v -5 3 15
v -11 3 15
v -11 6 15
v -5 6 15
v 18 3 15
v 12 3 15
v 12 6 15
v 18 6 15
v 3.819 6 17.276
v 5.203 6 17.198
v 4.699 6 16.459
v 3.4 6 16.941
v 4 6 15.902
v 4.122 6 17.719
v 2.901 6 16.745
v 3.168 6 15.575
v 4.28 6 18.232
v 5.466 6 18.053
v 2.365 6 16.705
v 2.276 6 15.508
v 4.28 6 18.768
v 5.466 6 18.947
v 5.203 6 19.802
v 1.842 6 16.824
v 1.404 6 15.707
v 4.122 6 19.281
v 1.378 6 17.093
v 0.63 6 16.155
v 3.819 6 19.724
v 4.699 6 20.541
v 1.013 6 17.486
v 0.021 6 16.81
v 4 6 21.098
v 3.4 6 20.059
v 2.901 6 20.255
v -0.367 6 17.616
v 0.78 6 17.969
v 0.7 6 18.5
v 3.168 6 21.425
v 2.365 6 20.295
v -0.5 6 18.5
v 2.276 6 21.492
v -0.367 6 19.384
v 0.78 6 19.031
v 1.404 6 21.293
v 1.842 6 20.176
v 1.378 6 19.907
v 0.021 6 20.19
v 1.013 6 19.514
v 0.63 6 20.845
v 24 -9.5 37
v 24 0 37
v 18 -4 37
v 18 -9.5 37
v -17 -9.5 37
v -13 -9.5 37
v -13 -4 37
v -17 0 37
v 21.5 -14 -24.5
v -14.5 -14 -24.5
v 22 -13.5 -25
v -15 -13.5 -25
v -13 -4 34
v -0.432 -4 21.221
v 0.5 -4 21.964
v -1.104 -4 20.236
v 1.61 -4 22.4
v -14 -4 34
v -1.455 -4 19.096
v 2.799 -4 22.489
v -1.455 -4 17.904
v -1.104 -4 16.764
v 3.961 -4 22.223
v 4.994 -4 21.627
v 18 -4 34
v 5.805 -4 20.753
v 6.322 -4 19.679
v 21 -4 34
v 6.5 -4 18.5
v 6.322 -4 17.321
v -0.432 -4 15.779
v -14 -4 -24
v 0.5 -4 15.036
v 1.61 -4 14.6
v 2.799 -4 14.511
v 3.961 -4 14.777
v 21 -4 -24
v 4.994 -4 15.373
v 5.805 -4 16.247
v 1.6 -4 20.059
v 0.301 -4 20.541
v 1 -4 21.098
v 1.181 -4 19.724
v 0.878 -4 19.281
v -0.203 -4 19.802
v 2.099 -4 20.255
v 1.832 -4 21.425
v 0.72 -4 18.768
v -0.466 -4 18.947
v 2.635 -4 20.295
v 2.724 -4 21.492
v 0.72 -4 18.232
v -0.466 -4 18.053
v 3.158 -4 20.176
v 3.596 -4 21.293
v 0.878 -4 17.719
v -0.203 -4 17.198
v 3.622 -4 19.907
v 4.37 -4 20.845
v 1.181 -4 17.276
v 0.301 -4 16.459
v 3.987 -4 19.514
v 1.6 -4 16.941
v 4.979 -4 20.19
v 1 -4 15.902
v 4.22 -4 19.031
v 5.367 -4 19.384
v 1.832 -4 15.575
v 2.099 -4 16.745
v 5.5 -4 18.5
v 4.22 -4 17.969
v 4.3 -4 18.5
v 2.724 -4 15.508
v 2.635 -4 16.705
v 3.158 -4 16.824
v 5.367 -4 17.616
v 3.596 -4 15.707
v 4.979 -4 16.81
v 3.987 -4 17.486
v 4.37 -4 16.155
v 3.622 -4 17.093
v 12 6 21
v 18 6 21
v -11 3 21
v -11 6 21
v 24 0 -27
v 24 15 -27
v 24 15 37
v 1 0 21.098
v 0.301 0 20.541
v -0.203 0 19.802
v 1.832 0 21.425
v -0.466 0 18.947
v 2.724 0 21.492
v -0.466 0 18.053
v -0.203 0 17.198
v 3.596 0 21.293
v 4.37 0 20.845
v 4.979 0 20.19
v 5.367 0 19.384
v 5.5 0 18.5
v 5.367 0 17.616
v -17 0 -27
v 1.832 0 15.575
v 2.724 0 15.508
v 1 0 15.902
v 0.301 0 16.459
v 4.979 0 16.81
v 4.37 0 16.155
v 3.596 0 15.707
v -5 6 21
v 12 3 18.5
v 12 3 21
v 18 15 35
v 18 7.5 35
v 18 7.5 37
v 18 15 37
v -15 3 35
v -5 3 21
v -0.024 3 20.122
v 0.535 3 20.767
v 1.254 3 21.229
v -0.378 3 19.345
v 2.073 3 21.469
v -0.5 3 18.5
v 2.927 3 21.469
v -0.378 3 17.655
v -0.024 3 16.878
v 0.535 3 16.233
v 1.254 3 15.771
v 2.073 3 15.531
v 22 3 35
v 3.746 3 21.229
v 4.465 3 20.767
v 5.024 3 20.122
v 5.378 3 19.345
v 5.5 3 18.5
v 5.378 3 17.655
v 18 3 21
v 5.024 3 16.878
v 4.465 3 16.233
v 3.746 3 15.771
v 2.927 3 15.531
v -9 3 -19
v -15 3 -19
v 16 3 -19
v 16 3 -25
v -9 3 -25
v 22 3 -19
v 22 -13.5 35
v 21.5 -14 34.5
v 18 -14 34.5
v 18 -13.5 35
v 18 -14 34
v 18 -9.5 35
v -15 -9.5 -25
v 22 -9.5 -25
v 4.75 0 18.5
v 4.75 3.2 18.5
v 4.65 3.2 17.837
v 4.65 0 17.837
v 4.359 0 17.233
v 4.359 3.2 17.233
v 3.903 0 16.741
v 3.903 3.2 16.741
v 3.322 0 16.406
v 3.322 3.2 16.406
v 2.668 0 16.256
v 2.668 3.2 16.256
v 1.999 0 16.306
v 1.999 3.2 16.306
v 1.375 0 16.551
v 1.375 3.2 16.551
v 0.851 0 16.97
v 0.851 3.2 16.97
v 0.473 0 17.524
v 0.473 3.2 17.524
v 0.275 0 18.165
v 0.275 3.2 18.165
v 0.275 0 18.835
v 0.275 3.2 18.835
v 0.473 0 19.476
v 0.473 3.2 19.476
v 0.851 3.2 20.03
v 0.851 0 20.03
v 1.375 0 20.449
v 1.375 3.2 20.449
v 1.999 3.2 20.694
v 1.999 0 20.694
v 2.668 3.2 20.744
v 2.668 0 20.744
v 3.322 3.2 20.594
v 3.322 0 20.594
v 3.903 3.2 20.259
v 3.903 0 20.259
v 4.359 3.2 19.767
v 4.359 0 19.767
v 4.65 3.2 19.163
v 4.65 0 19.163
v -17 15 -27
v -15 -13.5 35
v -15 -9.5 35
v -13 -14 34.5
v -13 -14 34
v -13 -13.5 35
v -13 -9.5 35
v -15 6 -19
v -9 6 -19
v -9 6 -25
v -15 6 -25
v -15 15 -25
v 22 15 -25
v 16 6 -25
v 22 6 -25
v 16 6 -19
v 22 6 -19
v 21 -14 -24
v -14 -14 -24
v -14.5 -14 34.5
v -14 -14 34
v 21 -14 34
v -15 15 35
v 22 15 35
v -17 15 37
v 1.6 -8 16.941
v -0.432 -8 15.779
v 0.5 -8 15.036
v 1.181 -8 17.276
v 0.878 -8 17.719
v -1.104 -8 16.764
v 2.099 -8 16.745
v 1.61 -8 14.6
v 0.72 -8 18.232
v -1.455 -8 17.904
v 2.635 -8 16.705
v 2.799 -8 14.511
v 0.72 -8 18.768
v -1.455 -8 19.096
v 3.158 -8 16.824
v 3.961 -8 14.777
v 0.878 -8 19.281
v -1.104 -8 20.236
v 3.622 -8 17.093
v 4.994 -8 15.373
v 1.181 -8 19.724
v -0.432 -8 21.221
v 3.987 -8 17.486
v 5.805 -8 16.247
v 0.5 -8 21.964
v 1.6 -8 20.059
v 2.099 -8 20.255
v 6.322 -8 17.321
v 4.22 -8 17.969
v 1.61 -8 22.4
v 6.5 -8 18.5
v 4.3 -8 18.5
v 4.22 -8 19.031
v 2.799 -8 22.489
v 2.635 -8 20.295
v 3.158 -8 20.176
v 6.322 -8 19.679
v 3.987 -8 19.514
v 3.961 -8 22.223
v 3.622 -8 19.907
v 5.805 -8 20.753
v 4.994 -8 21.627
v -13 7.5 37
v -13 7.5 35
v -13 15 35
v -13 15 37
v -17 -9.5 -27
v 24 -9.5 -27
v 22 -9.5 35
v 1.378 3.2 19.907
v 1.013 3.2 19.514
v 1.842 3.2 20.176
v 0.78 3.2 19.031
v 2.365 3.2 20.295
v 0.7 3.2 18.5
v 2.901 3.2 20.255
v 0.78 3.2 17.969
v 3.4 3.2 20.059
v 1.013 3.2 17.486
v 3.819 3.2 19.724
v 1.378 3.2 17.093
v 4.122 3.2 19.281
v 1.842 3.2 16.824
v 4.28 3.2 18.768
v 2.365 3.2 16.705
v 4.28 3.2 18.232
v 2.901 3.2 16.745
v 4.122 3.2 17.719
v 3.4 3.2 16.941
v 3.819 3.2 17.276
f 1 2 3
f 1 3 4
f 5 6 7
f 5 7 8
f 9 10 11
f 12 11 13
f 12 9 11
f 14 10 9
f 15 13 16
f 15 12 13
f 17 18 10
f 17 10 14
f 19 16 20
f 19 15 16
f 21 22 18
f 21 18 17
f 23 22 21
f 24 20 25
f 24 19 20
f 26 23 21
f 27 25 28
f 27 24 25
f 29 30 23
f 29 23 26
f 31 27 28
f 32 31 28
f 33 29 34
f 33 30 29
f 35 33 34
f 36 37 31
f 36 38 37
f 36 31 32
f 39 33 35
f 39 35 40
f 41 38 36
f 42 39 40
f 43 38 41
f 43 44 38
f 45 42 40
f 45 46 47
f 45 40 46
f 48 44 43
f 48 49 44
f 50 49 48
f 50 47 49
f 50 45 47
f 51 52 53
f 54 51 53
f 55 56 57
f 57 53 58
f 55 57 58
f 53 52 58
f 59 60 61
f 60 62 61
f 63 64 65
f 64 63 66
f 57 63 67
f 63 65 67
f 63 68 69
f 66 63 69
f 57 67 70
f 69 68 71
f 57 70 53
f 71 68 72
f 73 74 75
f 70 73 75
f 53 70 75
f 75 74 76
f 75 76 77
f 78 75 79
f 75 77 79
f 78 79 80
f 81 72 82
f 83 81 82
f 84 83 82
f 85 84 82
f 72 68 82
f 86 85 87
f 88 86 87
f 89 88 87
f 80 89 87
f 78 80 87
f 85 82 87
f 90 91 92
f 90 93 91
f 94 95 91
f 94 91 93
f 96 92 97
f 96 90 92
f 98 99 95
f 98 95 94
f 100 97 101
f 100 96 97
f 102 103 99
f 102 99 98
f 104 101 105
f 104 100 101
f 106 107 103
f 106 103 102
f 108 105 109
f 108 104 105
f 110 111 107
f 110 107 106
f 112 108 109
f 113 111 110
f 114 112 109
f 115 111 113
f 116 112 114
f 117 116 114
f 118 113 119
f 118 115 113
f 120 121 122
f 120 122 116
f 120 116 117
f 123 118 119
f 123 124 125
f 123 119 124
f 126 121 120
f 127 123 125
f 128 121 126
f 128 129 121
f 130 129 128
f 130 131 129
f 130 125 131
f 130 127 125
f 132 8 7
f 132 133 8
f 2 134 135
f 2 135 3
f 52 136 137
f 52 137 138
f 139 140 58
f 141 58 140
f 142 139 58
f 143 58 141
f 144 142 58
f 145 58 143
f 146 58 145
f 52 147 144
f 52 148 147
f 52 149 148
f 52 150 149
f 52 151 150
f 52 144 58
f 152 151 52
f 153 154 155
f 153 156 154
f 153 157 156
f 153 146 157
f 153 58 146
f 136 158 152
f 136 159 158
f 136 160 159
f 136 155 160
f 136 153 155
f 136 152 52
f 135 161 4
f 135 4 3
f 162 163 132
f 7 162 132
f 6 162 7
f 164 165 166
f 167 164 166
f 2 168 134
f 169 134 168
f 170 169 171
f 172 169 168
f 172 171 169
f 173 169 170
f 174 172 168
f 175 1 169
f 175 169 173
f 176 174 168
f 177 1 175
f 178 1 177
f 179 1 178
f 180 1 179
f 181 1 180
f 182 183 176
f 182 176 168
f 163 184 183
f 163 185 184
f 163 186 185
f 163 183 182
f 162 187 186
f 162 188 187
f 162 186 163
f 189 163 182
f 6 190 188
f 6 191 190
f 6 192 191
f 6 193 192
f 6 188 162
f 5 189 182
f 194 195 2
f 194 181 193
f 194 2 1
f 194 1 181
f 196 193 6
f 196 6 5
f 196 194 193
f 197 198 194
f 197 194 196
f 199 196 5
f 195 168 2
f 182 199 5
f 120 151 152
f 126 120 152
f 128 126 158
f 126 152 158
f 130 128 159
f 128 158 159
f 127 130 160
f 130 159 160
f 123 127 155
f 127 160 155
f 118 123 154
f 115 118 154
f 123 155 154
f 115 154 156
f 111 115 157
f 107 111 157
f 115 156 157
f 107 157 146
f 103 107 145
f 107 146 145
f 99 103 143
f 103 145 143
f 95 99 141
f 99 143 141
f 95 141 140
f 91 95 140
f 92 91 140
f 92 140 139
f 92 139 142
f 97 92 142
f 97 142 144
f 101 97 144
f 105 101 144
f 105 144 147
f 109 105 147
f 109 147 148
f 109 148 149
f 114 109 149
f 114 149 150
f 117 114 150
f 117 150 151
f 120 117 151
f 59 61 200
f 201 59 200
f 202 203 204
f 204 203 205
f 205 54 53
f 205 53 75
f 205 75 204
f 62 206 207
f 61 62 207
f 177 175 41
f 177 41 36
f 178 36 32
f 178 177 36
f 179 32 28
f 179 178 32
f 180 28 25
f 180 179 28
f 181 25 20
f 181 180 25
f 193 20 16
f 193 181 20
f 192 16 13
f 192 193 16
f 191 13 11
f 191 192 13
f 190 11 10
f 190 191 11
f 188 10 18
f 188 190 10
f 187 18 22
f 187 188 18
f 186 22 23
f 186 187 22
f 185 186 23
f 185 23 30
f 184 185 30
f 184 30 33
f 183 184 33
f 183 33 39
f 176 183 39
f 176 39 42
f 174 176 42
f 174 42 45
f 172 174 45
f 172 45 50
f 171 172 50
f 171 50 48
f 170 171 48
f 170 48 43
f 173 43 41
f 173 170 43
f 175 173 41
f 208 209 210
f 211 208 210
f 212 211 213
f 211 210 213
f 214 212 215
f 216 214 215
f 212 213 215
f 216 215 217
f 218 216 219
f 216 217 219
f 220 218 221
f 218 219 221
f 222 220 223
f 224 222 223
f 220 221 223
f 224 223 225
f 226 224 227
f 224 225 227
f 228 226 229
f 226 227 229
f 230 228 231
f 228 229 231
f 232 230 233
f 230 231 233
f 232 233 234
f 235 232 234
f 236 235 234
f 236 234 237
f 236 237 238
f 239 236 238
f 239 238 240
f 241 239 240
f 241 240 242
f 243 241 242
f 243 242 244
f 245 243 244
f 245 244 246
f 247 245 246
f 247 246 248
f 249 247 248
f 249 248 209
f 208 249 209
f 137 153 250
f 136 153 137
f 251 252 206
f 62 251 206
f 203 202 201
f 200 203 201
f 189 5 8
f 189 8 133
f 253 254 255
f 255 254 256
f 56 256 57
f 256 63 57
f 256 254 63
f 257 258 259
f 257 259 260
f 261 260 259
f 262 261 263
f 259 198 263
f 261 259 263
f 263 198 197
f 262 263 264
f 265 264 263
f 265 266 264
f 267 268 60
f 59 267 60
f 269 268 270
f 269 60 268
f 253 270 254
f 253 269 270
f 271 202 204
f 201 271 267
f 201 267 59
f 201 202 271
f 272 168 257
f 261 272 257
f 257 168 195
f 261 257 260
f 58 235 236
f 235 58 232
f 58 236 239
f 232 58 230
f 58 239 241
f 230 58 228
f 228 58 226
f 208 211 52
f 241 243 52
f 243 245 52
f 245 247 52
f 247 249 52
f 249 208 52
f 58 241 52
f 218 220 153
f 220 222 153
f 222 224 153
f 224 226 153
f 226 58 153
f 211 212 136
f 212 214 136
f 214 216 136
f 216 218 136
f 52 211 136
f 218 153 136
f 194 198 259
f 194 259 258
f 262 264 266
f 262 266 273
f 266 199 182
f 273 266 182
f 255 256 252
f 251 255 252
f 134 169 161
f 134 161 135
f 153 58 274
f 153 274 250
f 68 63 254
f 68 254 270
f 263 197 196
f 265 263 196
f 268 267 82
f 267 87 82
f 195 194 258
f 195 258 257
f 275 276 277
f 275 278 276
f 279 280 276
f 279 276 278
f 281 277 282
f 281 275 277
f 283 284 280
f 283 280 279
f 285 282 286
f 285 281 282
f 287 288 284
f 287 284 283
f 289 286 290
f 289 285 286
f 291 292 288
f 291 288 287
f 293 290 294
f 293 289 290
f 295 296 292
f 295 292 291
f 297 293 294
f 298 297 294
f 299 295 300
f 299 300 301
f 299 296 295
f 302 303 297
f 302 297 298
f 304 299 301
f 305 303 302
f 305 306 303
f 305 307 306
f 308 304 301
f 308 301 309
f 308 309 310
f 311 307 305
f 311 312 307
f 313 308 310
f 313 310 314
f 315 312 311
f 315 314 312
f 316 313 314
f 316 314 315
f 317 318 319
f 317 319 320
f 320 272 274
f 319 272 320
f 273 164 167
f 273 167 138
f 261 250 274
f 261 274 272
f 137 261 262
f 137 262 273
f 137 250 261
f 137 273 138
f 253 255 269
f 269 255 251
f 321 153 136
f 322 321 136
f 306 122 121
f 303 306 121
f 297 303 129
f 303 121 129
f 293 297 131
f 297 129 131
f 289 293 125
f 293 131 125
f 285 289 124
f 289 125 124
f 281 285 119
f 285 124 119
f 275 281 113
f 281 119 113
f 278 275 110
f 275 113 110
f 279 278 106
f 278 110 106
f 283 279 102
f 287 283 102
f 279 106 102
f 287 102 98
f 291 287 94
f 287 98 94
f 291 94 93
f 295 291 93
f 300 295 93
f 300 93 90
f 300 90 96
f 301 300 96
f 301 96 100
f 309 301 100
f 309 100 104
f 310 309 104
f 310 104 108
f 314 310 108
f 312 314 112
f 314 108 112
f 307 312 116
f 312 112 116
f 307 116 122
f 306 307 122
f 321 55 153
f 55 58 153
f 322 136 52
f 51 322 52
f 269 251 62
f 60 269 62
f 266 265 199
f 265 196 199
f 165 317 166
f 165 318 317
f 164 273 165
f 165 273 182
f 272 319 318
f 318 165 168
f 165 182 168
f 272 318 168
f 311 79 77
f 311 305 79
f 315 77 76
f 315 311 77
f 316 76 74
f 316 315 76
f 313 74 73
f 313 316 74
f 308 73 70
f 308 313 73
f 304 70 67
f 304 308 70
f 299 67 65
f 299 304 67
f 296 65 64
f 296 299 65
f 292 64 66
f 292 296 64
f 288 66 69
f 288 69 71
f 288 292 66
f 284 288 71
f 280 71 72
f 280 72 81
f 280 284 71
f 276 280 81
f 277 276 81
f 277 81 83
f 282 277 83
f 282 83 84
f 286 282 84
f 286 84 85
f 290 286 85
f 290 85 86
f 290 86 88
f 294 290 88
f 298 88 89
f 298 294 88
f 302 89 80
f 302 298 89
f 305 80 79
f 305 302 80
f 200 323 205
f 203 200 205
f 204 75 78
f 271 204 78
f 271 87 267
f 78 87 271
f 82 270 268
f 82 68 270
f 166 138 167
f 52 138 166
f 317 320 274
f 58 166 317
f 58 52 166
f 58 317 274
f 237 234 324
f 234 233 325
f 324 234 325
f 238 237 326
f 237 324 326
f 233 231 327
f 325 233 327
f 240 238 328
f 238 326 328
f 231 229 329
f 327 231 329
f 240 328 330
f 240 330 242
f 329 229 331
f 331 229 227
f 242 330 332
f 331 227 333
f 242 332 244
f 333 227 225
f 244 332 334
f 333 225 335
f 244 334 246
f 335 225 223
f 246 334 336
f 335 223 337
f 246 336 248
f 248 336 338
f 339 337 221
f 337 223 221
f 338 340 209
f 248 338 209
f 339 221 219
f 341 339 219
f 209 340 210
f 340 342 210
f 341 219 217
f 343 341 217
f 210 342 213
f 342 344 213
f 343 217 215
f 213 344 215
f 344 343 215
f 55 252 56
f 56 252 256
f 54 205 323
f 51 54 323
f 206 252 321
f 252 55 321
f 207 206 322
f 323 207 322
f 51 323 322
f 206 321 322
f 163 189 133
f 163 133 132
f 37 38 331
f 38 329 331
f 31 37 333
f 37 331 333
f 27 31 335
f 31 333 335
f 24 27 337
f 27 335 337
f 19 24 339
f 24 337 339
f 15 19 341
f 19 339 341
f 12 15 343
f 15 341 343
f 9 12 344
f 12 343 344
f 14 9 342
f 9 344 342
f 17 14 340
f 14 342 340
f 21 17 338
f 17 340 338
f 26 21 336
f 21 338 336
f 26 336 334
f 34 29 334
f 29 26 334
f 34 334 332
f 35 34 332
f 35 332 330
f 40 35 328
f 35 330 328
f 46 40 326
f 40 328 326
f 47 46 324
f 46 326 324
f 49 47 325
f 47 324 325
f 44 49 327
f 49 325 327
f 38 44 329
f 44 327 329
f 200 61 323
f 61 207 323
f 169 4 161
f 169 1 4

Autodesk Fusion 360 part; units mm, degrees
sketch "Sketch1" plane through (0, 0, 0) normal (0, 1, 0) x (1, 0, 0)
  line L0 (-15, 25) -> (22, 25)
  line L1 (22, 25) -> (22, -35)
  line L2 (-15, -35) -> (-15, 25)
  line L3 (-15, -35) -> (-13, -35)
  line L4 (22, -35) -> (18, -35)
  line L5 (24, -37) -> (-17, -37)
  line L6 (-17, -37) -> (-17, 27)
  line L7 (-17, 27) -> (24, 27)
  line L8 (24, 27) -> (24, -37)
  line L9 (18, -35) -> (18, -37)
  line L10 (-13, -35) -> (-13, -37)
  line L11 (18, -35) -> (18, -18.5)
  line L12 (22, -18.5) -> (2.5, -18.5)
  circle A0 centre (2.5, -18.5) radius 1.8
  line L13 (-13, -35) -> (18, -35)
  dimension "d1" = 37
  dimension "d2" = 60
  dimension "d4" = 2
  dimension "d5" = 4
  dimension "d6" = 16.5
  dimension "d7" = 19.5
  dimension "d8" = 3.6
extrude "Extrude1" add sketch "Sketch1" along normal blind 3 makes body 1
sketch "Sketch2" plane through (0, 3, 0) normal (0, 1, 0) x (-1, 0, 0)
  circle A0 centre (-2.5, 18.5) radius 1.8
  line L0 (-24, -27) -> (17, -27)
  line L1 (17, -27) -> (17, 37)
  line L2 (17, 37) -> (-24, 37)
  line L3 (-24, 37) -> (-24, -27)
  circle A1 centre (-2.5, 18.5) radius 3
  dimension "d11" = 6
extrude "Extrude2" add sketch "Sketch2" along normal blind 3 contours A1 bodies 1
extrude "Extrude3" add sketch "Sketch1" along normal blind 15 contours L0 L1 L2 L3 L4 L5 L6 L7 L8 L9 L10 bodies 1
sketch "Sketch3" plane through (0, 3, 0) normal (0, 1, 0) x (-1, 0, 0)
  line L0 (13, 35) -> (13, 37)
  line L1 (13, 37) -> (-18, 37)
  line L2 (-18, 37) -> (-18, 35)
  line L3 (-18, 35) -> (-22, 35)
  line L4 (-22, 35) -> (-22, -25)
  line L5 (-22, -25) -> (15, -25)
  line L6 (15, -25) -> (15, 35)
  line L7 (15, 35) -> (13, 35)
  circle A0 centre (-2.5, 18.5) radius 3
  line L8 (-12, 15) -> (-18, 15)
  line L9 (-18, 15) -> (-18, 21)
  line L10 (-18, 21) -> (-12, 21)
  line L11 (-12, 21) -> (-12, 15)
  line L12 (11, 15) -> (5, 15)
  line L13 (5, 15) -> (5, 21)
  line L14 (5, 21) -> (11, 21)
  line L15 (11, 21) -> (11, 15)
  line L16 (15, -25) -> (9, -25)
  line L17 (9, -25) -> (9, -19)
  line L18 (9, -19) -> (15, -19)
  line L19 (15, -19) -> (15, -25)
  line L20 (-22, -25) -> (-16, -25)
  line L21 (-16, -25) -> (-16, -19)
  line L22 (-16, -19) -> (-22, -19)
  line L23 (-22, -19) -> (-22, -25)
  dimension "d16" = 6
  dimension "d17" = 6
  dimension "d18" = 6
  dimension "d19" = 6
  dimension "d20" = 6
  dimension "d21" = 6
extrude "Extrude4" add sketch "Sketch3" along normal blind 3 contours L5 L6 L16 L17 L18 L19 | L4 L5 L20 L21 L22 L23 | L8 L9 L10 L11 | L12 L13 L14 L15 bodies 1
extrude "Extrude5" add sketch "Sketch1" along normal blind 7.5 contours L5 L9 L10 L13 bodies 1
cylinder "CylinderPrimitive1" cut diameter 4.5 height 3.2 placed x (1, 0, 0) y (0, 0, -1) z (0, 1, 0) at (2.5, 0, 18.5) bodies 1
extrude "Extrude7" add sketch "Sketch1" against normal blind 4 separate body makes body 2
extrude "Extrude8" add sketch "Sketch1" against normal blind 9.5 contours L0 L1 L2 L3 L4 L5 L6 L7 L8 L9 L10 bodies 2
sketch "Sketch5" plane through (0, -4, 0) normal (0, -1, 0) x (1, 0, 0)
  line L0 (18, 35) -> (18, 37)
  line L1 (18, 37) -> (-13, 37)
  line L2 (-13, 37) -> (-13, 35)
  line L3 (-13, 35) -> (-15, 35)
  line L4 (-15, 35) -> (-15, -25)
  line L5 (-15, -25) -> (22, -25)
  line L6 (22, -25) -> (22, 35)
  line L7 (22, 35) -> (18, 35)
  circle A0 centre (2.5, 18.5) radius 1.8
  line L8 (18, 35) -> (18, 34)
  line L9 (18, 34) -> (21, 34)
  line L10 (-13, 35) -> (-13, 34)
  line L11 (-13, 34) -> (-14, 34)
  line L12 (-14, 34) -> (-14, -24)
  line L13 (22, -25) -> (22, -24)
  line L14 (21, -24) -> (-14, -24)
  line L15 (22, -25) -> (21, -25)
  line L16 (21, -24) -> (21, 34)
extrude "Extrude9" add sketch "Sketch5" along normal blind 10 contours L3 L4 L5 L6 L7 L8 L9 L10 L11 L12 L13 L14 L15 L16 bodies 2
chamfer "Chamfer1" distance 0.5 angle 45 5 edges at (-14, -14, 35) (-15, -14, 5) (3.5, -14, -25) (22, -14, 5) (20, -14, 35) on bodies 2
cylinder "CylinderPrimitive2" add diameter 8 height 4 placed x (1, 0, 0) y (0, 0, 1) z (0, -1, 0) at (2.5, -4, 18.5) bodies 2
cylinder "CylinderPrimitive3" cut diameter 6 height -4 placed x (1, 0, 0) y (0, 0, -1) z (0, 1, 0) at (2.5, 0, 18.5) bodies 2
cylinder "CylinderPrimitive4" cut diameter 3.6 height -8 placed x (1, 0, 0) y (0, 0, -1) z (0, 1, 0) at (2.5, 0, 18.5) bodies 2
